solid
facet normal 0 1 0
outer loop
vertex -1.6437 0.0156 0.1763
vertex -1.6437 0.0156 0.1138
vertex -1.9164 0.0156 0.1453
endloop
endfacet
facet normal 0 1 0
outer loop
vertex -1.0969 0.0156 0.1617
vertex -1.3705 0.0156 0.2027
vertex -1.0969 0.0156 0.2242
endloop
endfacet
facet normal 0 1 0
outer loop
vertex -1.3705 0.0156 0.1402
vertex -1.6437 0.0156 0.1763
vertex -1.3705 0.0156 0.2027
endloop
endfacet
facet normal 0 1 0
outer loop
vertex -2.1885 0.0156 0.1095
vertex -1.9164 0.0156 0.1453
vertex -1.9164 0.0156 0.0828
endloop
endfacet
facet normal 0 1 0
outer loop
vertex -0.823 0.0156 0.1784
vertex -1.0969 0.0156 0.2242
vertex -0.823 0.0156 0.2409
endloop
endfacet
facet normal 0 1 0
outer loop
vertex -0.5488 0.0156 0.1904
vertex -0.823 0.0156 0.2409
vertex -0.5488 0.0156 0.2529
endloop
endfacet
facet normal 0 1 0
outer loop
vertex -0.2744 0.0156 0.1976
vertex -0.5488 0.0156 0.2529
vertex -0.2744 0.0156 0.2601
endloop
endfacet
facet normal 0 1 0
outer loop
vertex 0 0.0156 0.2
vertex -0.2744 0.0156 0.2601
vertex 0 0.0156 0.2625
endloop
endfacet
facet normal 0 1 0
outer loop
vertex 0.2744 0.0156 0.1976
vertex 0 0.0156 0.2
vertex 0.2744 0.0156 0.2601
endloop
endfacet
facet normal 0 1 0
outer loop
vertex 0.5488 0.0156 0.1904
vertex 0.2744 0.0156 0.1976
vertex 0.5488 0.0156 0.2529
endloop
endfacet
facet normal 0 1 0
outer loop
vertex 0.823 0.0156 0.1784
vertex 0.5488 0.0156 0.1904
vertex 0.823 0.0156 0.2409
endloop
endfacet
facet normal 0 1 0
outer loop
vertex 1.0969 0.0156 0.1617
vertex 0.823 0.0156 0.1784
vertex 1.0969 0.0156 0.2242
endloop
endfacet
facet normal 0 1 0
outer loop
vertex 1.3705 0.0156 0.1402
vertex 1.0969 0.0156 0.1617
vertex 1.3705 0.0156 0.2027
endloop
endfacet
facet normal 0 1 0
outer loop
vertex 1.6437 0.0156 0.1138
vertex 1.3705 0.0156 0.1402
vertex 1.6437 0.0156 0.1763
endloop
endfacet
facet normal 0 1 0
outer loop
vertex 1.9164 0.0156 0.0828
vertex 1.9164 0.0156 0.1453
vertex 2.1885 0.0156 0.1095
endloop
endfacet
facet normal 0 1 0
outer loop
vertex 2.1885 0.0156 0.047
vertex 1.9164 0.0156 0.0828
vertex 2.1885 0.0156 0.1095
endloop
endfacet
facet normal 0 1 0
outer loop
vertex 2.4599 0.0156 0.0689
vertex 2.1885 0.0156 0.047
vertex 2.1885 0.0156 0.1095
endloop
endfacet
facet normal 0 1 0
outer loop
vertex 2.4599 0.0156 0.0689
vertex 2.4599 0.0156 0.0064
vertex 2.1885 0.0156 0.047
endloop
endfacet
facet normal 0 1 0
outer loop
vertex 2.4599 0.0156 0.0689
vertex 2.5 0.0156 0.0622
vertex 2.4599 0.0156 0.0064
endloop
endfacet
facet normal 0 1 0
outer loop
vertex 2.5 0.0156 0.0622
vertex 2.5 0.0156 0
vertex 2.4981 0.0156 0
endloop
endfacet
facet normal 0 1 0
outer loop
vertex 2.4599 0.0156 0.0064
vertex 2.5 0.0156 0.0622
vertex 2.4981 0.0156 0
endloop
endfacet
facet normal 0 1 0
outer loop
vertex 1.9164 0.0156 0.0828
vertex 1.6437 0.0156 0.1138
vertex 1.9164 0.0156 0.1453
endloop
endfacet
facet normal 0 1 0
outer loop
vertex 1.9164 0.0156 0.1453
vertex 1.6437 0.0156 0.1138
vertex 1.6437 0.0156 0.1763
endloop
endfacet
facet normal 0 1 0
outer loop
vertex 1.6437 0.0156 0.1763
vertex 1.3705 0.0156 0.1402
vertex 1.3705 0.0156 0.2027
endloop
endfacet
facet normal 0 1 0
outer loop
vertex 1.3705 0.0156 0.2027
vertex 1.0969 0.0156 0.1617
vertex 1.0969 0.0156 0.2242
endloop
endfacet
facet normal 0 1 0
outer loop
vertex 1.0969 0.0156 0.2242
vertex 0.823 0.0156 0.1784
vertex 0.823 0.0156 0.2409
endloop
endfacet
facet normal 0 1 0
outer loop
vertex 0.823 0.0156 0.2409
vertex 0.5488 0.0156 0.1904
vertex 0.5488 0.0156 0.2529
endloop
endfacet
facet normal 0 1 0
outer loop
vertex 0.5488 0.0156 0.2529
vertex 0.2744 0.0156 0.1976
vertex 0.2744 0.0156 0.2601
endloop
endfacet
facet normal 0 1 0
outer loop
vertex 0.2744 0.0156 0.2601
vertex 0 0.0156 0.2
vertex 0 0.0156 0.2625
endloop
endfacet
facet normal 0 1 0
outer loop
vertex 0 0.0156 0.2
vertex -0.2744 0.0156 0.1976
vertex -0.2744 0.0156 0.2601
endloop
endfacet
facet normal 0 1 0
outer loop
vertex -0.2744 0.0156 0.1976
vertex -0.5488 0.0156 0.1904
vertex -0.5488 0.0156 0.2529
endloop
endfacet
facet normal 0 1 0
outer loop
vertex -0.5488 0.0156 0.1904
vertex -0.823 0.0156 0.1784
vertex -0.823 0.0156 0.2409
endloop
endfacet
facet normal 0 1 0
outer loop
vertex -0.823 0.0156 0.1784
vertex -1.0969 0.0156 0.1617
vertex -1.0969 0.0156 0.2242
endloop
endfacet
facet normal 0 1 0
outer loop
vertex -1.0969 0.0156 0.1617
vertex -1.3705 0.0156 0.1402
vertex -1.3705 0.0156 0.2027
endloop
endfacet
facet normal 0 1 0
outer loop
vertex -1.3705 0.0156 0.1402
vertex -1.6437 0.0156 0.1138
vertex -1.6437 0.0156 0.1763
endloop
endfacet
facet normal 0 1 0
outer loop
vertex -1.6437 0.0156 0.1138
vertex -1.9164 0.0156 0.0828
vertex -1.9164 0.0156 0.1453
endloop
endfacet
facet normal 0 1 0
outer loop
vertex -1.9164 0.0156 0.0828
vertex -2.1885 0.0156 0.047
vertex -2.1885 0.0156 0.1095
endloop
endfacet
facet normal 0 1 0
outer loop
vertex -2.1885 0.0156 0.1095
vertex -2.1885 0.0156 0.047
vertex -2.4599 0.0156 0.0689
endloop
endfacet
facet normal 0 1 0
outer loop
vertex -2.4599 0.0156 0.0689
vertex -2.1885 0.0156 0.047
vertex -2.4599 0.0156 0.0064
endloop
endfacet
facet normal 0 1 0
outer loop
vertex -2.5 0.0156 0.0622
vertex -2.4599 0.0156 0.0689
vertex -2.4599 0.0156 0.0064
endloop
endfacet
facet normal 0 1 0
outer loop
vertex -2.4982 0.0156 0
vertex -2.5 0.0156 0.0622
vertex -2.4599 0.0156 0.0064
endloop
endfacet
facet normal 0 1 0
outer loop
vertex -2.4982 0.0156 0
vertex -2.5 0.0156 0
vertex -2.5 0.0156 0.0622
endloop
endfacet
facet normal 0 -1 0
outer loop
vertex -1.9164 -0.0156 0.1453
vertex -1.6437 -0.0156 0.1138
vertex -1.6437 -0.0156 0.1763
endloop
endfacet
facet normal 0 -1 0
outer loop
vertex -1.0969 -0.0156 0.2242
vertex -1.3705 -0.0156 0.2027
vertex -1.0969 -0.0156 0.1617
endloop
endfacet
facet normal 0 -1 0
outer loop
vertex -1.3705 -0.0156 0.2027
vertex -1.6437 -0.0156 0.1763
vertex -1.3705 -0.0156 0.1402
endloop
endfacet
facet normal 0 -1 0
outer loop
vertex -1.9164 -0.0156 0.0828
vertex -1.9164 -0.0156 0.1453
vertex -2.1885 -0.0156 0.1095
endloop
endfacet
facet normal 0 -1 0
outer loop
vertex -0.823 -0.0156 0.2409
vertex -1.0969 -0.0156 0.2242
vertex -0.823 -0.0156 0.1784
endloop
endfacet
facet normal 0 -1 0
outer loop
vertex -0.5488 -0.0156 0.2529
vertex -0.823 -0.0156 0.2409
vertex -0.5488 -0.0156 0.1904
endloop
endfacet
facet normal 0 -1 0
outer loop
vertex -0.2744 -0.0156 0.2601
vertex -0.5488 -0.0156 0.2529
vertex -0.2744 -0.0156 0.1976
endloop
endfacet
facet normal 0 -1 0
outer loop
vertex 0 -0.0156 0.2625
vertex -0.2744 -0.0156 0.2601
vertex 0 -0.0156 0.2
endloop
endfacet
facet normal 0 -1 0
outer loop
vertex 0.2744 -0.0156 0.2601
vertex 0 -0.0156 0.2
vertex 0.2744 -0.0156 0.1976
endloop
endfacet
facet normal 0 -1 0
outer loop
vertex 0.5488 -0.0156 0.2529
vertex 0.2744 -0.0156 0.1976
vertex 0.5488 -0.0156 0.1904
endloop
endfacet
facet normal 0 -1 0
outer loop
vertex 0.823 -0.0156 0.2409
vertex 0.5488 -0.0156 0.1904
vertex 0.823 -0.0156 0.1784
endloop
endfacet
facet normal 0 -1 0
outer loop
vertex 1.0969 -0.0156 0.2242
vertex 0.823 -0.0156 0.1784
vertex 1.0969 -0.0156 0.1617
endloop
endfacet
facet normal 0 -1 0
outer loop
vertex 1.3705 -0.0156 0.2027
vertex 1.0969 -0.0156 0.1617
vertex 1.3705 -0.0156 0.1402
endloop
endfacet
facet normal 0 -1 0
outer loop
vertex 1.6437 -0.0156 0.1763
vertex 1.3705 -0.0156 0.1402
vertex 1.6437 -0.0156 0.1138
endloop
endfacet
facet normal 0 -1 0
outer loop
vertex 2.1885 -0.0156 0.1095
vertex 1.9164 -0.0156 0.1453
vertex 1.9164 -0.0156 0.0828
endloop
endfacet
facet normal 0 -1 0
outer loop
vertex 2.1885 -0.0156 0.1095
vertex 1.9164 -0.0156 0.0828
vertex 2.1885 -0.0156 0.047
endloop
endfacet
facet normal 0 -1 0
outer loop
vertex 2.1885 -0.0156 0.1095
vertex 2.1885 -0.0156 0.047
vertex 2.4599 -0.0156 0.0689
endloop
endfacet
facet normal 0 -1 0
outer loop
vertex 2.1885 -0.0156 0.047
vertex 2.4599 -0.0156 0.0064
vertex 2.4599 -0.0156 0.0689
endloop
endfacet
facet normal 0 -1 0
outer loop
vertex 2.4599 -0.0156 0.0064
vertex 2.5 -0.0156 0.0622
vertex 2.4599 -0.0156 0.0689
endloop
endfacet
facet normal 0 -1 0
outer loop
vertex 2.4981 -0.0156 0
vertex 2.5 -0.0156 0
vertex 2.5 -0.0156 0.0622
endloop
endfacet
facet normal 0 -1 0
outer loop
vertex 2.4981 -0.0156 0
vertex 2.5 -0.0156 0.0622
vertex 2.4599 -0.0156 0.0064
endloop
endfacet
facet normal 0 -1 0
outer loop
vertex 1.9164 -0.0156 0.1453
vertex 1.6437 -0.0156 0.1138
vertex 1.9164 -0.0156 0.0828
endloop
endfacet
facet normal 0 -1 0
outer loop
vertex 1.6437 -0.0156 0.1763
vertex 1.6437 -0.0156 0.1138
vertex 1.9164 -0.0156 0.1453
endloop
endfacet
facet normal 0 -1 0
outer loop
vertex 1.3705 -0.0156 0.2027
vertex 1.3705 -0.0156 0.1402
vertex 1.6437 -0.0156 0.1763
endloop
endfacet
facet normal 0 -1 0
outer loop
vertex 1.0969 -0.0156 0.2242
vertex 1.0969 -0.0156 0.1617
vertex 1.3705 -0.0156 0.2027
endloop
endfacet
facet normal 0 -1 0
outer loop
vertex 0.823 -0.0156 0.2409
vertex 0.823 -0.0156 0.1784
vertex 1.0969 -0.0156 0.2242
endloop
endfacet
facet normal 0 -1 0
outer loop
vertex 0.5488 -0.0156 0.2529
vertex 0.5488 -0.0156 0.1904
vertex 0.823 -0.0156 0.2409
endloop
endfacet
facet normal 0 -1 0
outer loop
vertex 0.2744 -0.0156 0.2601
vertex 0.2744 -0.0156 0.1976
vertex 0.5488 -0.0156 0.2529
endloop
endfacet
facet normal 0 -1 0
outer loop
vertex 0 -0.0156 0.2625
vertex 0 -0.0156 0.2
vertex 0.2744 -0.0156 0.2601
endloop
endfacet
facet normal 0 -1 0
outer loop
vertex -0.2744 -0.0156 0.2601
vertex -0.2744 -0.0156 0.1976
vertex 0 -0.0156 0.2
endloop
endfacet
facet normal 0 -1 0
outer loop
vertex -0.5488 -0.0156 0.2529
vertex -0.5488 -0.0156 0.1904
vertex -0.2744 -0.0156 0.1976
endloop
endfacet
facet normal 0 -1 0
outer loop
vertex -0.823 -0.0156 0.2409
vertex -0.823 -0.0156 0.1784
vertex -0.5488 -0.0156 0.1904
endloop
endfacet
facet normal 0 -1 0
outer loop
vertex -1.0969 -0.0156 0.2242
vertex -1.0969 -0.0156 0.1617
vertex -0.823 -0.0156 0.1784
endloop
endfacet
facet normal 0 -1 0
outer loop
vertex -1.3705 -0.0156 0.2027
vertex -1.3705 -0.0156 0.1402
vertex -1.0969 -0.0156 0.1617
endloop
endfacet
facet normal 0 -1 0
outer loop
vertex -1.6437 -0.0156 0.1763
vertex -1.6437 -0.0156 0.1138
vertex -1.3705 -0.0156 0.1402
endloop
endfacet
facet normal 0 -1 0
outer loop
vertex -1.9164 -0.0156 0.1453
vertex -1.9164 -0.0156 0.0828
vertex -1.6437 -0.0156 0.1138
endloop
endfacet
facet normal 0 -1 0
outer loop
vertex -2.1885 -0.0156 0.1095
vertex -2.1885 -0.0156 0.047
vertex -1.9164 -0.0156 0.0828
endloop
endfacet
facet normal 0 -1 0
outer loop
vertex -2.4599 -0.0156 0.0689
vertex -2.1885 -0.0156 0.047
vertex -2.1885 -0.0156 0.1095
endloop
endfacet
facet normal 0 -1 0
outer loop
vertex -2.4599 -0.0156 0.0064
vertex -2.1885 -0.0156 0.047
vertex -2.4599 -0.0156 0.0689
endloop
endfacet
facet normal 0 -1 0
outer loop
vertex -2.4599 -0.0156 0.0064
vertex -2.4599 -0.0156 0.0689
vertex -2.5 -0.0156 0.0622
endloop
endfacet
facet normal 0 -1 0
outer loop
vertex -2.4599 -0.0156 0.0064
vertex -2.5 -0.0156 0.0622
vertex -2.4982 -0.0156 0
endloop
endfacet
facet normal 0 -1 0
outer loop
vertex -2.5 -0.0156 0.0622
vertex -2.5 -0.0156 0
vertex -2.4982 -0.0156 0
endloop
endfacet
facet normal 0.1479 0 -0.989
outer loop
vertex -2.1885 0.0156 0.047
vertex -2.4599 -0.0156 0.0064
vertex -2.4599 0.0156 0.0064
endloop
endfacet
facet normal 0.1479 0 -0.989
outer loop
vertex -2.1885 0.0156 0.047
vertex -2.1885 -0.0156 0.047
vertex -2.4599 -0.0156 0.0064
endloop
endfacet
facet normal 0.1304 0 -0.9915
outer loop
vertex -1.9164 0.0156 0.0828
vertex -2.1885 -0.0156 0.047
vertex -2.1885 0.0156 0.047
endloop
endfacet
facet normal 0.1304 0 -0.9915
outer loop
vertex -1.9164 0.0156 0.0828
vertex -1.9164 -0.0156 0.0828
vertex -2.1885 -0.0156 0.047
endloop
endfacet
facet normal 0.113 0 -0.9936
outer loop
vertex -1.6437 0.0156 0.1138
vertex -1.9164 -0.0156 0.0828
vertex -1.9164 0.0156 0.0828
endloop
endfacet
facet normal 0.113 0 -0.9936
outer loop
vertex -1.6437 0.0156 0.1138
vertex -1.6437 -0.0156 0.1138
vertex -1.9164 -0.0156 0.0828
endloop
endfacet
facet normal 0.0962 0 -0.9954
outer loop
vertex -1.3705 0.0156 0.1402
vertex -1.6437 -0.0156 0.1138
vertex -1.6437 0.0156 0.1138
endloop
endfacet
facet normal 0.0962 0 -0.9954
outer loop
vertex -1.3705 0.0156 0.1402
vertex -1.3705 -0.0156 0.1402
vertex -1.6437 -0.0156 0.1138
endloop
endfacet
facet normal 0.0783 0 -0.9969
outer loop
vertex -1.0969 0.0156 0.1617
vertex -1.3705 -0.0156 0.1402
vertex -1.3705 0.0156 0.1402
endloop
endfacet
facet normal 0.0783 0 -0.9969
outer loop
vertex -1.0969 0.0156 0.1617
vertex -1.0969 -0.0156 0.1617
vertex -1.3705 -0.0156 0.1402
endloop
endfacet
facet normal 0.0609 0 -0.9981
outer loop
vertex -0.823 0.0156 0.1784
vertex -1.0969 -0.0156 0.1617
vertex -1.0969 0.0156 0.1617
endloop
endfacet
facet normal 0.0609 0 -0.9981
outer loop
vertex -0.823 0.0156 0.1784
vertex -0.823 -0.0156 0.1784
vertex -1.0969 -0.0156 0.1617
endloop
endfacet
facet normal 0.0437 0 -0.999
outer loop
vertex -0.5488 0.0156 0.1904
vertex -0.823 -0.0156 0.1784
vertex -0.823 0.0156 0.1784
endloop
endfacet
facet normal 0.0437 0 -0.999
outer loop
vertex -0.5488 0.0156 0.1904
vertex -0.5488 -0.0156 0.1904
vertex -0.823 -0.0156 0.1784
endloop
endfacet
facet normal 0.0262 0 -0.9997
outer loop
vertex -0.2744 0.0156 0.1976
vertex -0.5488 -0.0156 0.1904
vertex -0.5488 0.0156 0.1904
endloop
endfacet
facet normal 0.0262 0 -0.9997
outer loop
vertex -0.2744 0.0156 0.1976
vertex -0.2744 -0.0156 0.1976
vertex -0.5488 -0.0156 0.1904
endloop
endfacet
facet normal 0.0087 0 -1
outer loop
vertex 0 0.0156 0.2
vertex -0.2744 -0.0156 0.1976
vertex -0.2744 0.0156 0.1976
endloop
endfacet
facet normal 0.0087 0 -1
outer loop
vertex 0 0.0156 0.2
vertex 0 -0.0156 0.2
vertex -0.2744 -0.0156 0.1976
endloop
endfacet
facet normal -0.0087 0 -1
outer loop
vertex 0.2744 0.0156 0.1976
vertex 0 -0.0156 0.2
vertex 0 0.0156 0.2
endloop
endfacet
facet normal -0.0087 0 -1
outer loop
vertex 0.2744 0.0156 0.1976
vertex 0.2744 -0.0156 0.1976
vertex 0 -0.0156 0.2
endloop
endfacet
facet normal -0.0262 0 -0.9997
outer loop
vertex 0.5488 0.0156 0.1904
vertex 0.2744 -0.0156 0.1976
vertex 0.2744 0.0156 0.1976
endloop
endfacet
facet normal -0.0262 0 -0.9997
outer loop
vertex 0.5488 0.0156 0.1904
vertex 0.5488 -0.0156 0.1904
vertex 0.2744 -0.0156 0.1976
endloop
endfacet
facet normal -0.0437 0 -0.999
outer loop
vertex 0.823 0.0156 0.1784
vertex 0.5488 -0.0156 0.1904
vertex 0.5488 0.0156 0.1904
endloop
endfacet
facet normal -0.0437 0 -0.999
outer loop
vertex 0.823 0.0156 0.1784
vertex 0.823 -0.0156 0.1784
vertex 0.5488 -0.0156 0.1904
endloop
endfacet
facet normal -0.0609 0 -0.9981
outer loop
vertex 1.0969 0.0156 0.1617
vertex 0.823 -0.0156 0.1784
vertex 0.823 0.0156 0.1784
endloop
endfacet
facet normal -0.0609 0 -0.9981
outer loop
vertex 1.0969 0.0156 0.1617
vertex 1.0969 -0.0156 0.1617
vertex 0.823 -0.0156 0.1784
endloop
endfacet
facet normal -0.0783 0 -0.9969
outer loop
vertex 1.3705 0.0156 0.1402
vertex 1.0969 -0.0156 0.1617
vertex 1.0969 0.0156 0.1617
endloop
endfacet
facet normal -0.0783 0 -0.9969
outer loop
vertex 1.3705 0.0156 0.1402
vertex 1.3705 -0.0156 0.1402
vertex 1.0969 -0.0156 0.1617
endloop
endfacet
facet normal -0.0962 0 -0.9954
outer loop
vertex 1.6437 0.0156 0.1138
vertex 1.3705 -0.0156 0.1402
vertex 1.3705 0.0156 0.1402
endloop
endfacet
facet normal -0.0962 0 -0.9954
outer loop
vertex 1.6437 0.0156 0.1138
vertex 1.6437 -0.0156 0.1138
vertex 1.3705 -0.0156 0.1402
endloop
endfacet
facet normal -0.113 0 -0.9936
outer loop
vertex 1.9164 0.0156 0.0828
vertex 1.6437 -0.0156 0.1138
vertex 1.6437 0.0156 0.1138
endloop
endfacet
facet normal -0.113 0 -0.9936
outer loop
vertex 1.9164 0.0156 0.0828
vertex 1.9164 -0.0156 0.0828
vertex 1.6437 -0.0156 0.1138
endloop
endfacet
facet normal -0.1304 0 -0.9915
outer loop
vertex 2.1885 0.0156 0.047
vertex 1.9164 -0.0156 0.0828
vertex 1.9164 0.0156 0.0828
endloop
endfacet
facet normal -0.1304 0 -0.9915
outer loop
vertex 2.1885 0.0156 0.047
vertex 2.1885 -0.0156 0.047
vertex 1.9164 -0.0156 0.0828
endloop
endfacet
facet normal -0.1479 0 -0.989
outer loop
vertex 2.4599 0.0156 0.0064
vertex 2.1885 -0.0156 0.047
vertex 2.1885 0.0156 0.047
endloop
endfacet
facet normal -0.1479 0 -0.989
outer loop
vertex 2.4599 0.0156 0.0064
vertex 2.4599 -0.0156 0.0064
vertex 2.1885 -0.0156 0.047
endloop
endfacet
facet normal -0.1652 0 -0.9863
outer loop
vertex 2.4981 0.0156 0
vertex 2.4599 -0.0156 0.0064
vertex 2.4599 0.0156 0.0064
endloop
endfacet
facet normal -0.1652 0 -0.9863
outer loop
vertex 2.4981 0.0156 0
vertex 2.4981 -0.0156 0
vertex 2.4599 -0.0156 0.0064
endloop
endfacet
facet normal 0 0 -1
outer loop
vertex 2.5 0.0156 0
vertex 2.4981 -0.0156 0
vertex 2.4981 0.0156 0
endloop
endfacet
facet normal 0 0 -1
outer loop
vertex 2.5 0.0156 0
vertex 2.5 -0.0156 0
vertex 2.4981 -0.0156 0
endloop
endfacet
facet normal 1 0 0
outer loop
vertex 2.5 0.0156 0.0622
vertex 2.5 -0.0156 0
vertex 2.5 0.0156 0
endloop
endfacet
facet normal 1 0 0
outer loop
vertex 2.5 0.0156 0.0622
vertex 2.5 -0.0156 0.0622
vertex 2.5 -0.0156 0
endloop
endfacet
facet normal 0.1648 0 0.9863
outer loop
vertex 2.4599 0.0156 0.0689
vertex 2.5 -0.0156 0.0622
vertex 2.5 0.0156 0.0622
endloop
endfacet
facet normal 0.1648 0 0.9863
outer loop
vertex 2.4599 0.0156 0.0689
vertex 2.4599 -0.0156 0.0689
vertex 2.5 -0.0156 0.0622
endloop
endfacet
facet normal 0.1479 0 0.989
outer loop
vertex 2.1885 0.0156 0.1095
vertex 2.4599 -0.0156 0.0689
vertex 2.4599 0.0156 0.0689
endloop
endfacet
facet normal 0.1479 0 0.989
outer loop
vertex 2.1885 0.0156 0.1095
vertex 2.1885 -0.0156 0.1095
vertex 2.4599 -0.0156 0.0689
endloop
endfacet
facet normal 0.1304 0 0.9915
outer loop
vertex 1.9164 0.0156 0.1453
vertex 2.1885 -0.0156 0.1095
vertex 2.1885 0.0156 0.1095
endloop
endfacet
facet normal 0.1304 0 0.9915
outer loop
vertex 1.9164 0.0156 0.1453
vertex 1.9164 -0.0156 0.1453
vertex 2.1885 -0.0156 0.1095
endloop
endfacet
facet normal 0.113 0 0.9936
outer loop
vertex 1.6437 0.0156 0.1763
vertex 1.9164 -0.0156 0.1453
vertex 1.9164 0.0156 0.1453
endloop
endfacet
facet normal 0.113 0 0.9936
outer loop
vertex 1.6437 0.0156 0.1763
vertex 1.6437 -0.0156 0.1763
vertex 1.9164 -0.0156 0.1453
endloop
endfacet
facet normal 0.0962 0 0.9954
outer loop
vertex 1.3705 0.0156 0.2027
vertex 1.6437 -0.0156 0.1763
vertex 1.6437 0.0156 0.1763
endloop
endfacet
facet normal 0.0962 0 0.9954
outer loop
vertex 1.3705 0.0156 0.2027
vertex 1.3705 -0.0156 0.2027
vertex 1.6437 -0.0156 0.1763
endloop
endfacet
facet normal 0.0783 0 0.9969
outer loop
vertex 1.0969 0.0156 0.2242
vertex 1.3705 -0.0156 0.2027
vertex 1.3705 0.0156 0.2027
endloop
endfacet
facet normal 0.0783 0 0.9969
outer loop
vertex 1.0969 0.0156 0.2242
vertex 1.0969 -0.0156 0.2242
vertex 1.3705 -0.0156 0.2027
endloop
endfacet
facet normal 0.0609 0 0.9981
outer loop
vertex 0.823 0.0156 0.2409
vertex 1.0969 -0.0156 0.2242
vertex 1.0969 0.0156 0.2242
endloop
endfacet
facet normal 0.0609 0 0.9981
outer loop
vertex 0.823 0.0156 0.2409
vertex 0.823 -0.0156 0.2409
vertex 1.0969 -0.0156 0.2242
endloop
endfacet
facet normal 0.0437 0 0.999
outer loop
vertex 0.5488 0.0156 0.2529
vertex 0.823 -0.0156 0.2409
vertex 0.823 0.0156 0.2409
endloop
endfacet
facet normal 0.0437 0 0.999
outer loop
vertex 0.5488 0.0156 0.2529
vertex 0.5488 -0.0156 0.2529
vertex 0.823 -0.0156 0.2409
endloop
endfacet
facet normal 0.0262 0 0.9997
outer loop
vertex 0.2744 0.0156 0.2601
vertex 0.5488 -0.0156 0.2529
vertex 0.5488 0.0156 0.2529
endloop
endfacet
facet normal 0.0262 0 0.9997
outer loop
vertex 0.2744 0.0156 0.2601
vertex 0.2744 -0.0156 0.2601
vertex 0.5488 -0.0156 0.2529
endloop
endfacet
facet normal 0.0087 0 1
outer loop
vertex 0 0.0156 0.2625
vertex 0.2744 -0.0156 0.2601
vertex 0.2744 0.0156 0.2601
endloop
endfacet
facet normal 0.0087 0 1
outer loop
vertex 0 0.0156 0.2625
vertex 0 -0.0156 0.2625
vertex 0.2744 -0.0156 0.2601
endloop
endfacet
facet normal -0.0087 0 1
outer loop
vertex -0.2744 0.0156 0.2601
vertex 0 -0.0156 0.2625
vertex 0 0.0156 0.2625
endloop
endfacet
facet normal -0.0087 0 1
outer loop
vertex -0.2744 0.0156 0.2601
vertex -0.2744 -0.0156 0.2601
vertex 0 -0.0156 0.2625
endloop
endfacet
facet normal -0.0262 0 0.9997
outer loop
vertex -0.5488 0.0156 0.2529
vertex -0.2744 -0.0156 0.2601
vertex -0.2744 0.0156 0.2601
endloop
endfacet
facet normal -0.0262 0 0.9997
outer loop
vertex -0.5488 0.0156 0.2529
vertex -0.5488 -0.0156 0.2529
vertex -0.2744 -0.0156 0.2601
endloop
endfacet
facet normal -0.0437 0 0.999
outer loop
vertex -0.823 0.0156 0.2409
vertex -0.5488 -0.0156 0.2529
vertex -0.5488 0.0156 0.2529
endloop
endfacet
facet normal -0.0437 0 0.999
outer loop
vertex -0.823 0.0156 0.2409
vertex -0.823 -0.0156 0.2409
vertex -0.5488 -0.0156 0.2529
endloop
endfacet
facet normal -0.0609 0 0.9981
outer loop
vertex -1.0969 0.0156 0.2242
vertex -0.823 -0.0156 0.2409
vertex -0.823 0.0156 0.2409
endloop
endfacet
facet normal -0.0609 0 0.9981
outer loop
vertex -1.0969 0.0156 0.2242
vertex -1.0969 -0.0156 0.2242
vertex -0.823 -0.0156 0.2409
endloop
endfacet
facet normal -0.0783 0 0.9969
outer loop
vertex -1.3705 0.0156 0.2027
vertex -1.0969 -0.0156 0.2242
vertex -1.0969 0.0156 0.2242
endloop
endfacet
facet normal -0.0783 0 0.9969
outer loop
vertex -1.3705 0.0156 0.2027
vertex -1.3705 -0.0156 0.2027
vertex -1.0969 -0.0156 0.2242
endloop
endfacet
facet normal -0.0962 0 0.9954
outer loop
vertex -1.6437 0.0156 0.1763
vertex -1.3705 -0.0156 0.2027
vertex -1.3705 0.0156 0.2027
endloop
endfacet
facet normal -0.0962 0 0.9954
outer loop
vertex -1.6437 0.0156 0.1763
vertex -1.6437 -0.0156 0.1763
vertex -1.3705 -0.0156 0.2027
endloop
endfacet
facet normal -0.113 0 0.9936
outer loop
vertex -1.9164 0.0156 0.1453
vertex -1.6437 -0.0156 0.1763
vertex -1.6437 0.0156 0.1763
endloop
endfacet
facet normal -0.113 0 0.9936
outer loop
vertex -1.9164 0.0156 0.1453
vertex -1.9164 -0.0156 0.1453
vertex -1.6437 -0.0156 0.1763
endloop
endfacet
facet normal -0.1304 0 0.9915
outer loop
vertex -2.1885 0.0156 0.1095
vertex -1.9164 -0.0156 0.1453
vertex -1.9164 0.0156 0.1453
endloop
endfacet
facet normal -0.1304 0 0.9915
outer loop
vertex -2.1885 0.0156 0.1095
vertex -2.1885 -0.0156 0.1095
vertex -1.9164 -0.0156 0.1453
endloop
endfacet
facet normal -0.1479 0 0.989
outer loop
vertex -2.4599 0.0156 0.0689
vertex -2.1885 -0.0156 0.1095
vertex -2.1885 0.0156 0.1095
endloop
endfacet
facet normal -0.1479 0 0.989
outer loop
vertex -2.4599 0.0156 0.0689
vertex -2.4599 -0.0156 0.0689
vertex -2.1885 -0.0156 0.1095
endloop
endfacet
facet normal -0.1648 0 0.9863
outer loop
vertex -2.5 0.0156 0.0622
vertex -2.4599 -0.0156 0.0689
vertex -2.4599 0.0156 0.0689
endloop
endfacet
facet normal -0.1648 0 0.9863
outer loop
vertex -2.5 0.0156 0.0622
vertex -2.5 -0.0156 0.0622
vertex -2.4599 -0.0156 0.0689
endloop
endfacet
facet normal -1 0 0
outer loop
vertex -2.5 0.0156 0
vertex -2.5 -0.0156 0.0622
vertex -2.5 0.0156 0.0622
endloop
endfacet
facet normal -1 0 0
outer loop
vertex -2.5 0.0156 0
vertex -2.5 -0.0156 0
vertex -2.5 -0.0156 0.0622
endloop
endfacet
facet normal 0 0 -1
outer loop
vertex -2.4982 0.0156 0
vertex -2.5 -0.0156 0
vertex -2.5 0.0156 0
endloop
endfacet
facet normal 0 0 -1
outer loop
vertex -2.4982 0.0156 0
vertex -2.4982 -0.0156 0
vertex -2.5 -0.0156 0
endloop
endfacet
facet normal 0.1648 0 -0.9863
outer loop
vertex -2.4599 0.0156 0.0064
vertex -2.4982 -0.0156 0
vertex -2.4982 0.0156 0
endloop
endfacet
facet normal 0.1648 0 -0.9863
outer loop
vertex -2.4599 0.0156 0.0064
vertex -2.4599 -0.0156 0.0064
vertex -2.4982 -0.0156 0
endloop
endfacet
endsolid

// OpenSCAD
//####################################
// rib.scad - circle template rib
// (c) 2021 by Roie R. Black
//====================================
$fn=360;
module circle_template_rib(chord,camber,height,thickness) {

  // calculate the radius for this arc
  camber = chord * camber / 100;
  radius = (chord * chord) / (8 * camber) + camber/2;
  theta = 90 - 2 * atan2(chord - 2*camber,chord + 2*camber);
  echo(radius,theta);

  // generate the rib
  translate([-chord/2,thickness/2,0])
    rotate([90,0,0])
      linear_extrude(height = thickness) {
        intersection() {
          difference() {
            square([chord,1]);
            translate([chord/2, -radius + camber]) circle(r=radius);
          }
          translate([chord/2, -radius + camber + height]) circle(r=radius);
        }
      }
}
//====================================
// display this shape

circle_template_rib(5,4,1/16,1/32,60,-30);
